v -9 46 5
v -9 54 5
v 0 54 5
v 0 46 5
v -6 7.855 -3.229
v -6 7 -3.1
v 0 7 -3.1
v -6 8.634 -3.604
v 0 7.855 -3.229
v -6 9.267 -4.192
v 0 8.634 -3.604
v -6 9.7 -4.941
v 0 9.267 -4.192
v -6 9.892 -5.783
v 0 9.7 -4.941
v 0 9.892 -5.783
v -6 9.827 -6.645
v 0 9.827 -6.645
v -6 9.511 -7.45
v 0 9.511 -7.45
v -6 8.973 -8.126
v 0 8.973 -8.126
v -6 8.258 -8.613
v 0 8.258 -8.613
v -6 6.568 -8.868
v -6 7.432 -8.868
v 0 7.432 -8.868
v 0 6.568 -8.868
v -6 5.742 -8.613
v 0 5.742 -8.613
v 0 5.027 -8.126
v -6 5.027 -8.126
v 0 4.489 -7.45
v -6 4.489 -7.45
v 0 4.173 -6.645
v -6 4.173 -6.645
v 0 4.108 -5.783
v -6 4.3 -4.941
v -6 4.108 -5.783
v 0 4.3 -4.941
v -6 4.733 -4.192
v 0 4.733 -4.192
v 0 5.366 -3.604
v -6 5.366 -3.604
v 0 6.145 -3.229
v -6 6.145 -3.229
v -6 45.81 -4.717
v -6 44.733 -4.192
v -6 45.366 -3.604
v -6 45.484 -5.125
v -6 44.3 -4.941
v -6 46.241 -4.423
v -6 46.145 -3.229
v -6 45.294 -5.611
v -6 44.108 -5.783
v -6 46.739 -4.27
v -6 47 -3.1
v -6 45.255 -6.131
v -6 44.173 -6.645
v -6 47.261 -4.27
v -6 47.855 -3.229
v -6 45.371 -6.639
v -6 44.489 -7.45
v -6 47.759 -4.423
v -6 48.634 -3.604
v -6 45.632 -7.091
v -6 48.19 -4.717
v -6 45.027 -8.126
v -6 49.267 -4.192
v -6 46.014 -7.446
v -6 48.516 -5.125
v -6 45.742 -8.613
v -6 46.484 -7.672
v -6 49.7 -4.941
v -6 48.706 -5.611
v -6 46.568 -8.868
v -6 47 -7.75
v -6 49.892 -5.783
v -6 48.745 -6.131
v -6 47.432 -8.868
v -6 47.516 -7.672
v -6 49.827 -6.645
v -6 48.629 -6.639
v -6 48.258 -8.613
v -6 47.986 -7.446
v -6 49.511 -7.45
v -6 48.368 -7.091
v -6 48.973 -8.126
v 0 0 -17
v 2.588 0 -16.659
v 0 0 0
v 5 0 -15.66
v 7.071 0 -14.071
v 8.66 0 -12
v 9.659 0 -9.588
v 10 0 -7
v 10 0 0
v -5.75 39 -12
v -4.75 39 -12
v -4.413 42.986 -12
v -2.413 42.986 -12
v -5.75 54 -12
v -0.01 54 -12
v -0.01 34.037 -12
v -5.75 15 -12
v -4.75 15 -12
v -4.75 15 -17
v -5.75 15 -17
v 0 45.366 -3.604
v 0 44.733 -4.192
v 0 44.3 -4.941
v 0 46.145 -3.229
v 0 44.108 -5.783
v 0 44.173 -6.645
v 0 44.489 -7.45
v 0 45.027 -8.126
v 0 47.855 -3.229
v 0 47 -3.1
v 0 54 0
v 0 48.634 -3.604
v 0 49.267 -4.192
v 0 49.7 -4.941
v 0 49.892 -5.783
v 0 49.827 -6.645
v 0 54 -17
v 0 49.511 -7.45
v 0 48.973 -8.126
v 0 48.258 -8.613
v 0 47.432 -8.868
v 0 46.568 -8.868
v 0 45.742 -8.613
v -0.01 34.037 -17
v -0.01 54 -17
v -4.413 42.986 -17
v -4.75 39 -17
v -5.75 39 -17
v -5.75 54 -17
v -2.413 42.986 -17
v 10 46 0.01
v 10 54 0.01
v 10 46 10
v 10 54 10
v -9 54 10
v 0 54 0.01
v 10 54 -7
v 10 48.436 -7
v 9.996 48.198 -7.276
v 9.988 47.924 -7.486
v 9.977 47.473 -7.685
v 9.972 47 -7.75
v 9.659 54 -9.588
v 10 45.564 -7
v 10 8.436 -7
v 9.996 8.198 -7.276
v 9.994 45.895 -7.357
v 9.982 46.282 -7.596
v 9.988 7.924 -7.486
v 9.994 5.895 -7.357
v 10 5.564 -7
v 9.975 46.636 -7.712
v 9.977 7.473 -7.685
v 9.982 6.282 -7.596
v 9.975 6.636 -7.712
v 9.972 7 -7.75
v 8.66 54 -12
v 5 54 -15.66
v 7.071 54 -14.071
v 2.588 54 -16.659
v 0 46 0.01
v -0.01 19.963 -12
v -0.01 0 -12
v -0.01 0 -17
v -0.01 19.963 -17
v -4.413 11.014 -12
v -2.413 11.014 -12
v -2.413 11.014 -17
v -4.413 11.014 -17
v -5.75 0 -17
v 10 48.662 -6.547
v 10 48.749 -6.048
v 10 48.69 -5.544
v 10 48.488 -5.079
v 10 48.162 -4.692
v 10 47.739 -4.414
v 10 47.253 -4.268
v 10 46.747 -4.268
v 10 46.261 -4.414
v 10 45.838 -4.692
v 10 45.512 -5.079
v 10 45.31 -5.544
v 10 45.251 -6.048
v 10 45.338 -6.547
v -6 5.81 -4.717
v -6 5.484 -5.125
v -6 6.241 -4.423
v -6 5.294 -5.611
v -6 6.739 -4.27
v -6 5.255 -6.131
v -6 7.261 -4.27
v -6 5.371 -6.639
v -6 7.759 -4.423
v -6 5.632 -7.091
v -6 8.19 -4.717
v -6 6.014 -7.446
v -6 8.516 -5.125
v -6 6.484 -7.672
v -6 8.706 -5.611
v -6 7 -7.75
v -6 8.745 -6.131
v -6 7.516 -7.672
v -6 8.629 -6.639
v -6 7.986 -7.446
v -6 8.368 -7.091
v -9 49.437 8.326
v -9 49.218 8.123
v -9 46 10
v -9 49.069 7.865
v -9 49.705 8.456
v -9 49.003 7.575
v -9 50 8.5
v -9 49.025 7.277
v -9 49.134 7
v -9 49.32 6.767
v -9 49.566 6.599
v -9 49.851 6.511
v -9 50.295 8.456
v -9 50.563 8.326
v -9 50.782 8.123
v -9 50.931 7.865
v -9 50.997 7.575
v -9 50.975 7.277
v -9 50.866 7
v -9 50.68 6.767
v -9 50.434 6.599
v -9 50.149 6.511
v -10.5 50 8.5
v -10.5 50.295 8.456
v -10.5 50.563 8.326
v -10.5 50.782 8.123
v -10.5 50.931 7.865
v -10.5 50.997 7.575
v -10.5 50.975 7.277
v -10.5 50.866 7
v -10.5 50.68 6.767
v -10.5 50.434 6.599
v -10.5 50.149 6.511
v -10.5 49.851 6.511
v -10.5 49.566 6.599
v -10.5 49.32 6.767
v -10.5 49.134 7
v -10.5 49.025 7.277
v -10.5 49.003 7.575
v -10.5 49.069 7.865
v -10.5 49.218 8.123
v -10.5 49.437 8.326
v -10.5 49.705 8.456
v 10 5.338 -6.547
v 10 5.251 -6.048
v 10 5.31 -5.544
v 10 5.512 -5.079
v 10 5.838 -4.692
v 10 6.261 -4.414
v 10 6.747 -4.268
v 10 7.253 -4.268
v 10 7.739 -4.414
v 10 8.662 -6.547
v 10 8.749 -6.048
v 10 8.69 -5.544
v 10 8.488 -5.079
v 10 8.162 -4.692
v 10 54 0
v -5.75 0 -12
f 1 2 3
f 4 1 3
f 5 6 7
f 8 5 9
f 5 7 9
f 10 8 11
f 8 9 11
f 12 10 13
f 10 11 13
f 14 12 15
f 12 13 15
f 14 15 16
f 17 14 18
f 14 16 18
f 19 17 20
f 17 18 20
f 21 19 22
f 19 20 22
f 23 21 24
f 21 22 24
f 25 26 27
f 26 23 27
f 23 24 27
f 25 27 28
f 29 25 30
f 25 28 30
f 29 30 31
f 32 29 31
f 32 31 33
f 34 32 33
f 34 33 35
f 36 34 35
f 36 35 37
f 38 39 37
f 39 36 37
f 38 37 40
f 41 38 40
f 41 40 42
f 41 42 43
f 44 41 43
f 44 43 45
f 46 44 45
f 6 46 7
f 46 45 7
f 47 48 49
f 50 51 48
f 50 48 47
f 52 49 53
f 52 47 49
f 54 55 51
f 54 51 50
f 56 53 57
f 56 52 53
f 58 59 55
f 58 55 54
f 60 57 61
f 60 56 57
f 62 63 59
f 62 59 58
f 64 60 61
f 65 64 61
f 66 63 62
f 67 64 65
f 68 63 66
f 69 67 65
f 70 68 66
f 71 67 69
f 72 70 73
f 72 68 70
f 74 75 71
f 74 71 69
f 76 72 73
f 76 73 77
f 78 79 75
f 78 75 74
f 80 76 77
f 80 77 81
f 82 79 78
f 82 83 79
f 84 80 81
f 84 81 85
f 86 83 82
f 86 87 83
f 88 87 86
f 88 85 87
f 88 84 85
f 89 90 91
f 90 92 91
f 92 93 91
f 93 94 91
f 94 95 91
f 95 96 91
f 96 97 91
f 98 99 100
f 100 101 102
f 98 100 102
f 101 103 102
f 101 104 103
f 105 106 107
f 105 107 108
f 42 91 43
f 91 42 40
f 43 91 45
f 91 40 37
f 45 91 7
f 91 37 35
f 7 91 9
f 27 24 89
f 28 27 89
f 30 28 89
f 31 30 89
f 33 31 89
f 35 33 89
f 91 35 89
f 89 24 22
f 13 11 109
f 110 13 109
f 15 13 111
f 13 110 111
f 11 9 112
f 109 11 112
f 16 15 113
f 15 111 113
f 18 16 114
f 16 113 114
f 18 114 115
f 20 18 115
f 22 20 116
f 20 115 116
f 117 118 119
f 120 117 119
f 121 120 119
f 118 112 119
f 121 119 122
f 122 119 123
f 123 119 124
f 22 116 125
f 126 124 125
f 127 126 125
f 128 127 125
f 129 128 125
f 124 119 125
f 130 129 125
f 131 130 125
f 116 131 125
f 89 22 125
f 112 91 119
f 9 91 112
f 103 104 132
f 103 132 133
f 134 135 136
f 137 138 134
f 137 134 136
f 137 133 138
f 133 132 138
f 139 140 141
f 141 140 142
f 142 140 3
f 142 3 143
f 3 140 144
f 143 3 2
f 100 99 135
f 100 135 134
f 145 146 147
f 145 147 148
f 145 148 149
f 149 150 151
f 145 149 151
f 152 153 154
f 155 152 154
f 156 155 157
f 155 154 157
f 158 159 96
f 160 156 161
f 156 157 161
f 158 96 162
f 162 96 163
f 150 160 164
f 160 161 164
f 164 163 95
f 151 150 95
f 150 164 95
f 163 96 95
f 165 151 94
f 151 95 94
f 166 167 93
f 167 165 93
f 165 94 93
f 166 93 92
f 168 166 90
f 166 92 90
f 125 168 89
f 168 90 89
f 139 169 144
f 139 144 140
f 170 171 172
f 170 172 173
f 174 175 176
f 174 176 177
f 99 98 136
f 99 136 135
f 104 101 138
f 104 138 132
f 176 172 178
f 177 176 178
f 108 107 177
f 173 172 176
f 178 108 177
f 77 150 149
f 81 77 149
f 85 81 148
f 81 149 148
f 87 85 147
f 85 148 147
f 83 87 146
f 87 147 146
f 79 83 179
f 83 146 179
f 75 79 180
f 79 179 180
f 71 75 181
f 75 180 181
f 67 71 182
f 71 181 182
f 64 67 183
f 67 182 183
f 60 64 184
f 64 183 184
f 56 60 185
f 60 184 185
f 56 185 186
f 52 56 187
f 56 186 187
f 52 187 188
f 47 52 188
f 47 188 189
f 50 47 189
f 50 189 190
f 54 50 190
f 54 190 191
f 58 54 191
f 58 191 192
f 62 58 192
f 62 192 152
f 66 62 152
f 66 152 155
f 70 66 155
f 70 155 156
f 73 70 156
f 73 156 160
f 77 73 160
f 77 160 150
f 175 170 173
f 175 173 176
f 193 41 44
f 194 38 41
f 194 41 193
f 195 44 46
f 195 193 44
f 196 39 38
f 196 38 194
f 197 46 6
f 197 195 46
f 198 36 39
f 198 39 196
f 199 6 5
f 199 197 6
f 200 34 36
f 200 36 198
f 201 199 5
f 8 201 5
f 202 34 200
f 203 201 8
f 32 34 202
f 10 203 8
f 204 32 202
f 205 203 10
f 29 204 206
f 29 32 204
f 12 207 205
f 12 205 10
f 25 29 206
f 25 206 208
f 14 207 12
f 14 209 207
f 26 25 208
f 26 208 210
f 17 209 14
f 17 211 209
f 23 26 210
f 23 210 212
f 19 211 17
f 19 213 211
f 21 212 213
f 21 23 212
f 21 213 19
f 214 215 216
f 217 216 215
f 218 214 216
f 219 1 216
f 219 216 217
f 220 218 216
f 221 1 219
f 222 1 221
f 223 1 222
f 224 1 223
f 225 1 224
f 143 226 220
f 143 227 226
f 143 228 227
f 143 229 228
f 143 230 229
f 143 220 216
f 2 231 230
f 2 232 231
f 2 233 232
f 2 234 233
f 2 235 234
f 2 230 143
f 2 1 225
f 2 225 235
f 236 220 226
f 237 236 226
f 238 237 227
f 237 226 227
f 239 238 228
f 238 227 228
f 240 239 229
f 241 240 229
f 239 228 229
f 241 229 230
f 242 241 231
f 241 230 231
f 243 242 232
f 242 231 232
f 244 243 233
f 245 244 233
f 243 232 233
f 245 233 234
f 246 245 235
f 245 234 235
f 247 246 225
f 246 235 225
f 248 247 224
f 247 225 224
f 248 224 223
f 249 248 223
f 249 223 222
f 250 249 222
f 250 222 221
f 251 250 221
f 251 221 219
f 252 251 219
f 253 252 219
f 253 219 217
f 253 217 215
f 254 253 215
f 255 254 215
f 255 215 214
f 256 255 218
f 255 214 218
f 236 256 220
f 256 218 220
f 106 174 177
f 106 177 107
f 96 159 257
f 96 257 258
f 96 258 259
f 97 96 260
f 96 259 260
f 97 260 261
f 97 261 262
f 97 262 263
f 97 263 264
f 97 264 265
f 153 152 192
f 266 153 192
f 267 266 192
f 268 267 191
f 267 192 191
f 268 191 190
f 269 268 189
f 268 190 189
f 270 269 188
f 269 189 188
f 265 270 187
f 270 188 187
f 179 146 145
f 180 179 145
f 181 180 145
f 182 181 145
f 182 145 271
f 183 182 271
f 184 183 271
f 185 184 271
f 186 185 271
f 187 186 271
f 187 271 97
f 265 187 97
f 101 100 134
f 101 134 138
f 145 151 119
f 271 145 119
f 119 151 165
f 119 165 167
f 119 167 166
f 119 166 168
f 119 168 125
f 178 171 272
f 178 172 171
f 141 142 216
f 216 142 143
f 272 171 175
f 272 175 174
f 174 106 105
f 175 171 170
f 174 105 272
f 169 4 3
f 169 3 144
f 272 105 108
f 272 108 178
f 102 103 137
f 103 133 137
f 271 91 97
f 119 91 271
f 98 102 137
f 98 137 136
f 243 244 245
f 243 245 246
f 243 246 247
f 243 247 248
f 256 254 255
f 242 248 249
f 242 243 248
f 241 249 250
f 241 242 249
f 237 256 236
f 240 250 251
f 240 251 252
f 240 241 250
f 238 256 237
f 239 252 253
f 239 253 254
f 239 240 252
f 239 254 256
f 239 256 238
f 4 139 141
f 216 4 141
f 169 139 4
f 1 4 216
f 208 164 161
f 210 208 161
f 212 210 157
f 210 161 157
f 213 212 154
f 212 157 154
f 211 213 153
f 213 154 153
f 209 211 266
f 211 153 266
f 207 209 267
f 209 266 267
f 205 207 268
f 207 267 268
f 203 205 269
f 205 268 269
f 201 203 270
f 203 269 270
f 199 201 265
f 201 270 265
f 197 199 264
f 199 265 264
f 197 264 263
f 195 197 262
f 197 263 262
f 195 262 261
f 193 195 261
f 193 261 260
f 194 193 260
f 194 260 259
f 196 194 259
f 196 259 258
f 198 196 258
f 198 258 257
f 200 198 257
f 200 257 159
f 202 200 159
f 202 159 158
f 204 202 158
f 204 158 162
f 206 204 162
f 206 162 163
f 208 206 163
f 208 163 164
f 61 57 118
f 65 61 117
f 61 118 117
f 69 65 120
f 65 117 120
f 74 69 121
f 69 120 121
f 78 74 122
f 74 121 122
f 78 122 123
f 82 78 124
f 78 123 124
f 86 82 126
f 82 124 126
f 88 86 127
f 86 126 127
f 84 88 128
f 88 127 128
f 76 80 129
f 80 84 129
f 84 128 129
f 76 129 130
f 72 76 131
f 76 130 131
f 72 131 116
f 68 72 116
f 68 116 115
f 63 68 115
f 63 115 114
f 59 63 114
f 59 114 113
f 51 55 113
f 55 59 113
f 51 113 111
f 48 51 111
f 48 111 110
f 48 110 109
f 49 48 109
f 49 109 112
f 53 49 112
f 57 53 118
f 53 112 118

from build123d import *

# Parameters (mm, degrees)
SKETCH1_W               = 12
SKETCH1_H               = 54
BOSS_EXTRUDE1_DEPTH     = 10
SKETCH2_R               = 2.9
BOSS_EXTRUDE2_DEPTH     = 18
SKETCH3_W               = 12
SKETCH3_H               = 54
BOSS_EXTRUDE3_DEPTH     = 10
SKETCH4_R               = 1.75
CUT_EXTRUDE1_DEPTH      = 50
SKETCH5_W               = 38
SKETCH5_H               = 54
BOSS_EXTRUDE4_DEPTH     = 5
FILLET1_R               = 10
SKETCH6_W               = 6
SKETCH6_H               = 54
CUT_EXTRUDE2_DEPTH      = 15
SKETCH7_W               = 0.01
SKETCH7_H               = 54
CUT_EXTRUDE3_DEPTH      = 12.5
BOSS_EXTRUDE5_DEPTH     = 8
SKETCH9_W               = 38
SKETCH9_H               = 0.01
CUT_EXTRUDE4_DEPTH      = 50
SKETCH10_W              = 11
SKETCH10_H              = 54
BOSS_EXTRUDE6_DEPTH     = 2.5
BOSS_EXTRUDE7_DEPTH     = 54
CUT_EXTRUDE5_DEPTH      = 10
CUT_EXTRUDE5_DEPTH_BACK = 5
CUT_EXTRUDE6_DEPTH      = 67.550732692
CUT_EXTRUDE6_DEPTH_BACK = 67.550732692
SKETCH15_W              = 34.984132004
SKETCH15_H              = 56.27391211
SKETCH16_R              = 1
BOSS_EXTRUDE8_DEPTH     = 1.5


with BuildPart() as part:
    # Sketch1 → Boss-Extrude1 (new body)
    with BuildSketch(Plane(origin=(0, 0, 0), x_dir=(0, 0, -1), z_dir=(1, 0, 0))):
        with Locations((6, 27)):
            Rectangle(SKETCH1_W, SKETCH1_H)
    extrude(amount=BOSS_EXTRUDE1_DEPTH)

    # Sketch2 → Boss-Extrude2 (add)
    with BuildSketch(Plane.ZY):
        with Locations((-6, 47)):
            Circle(SKETCH2_R)
        with Locations((-6, 7)):
            Circle(SKETCH2_R)
    extrude(amount=BOSS_EXTRUDE2_DEPTH)

    # Sketch3 → Boss-Extrude3 (add)
    with BuildSketch(Plane.ZY.offset(18)):
        with Locations((-6, 27)):
            Rectangle(SKETCH3_W, SKETCH3_H)
    extrude(amount=BOSS_EXTRUDE3_DEPTH)

    # Sketch4 → Cut-Extrude1 (cut)
    with BuildSketch(Plane(origin=(10, 0, 0), x_dir=(0, 0, -1), z_dir=(1, 0, 0))):
        with Locations((6, 47)):
            Circle(SKETCH4_R)
        with Locations((6, 7)):
            Circle(SKETCH4_R)
    extrude(amount=-CUT_EXTRUDE1_DEPTH, mode=Mode.SUBTRACT)

    # Sketch5 → Boss-Extrude4 (add)
    with BuildSketch(Plane(origin=(0, 0, -12), x_dir=(-1, 0, 0), z_dir=(0, 0, -1))):
        with Locations((9, 27)):
            Rectangle(SKETCH5_W, SKETCH5_H)
    extrude(amount=BOSS_EXTRUDE4_DEPTH)

    # Fillet1
    # the kernel refuses this fillet: 10 mm, written as the material it takes off along each edge
    with BuildSketch(Plane(origin=(10, -25, -17), x_dir=(-1, 0, 0), z_dir=(0, 1, 0))) as fillet1_piece_1:
        with BuildLine():
            CenterArc((FILLET1_R, FILLET1_R), FILLET1_R, 180, 90)
            Line((0, FILLET1_R), (0, 0))
            Line((0, 0), (FILLET1_R, 0))
        make_face()
    extrude(amount=104, mode=Mode.SUBTRACT)
    with BuildSketch(Plane(origin=(-28, 79, -17), x_dir=(0, 0, 1), z_dir=(0, -1, 0))) as fillet1_piece_2:
        with BuildLine():
            CenterArc((FILLET1_R, -FILLET1_R), FILLET1_R, 90, 90)
            Line((0, -FILLET1_R), (0, 0))
            Line((0, 0), (FILLET1_R, 0))
        make_face()
    extrude(amount=104, mode=Mode.SUBTRACT)

    # Sketch6 → Cut-Extrude2 (cut)
    with BuildSketch(Plane.XY.offset(-12)):
        with Locations((-9, 27)):
            Rectangle(SKETCH6_W, SKETCH6_H)
    extrude(amount=CUT_EXTRUDE2_DEPTH, mode=Mode.SUBTRACT)

    # Sketch7 → Cut-Extrude3 (cut)
    with BuildSketch(Plane.XY.offset(-12)):
        with Locations((-17.995, 27)):
            Rectangle(SKETCH7_W, SKETCH7_H)
        with Locations((-0.005, 27)):
            Rectangle(SKETCH7_W, SKETCH7_H)
    extrude(amount=-CUT_EXTRUDE3_DEPTH, mode=Mode.SUBTRACT)


with BuildPart() as cut_extrude3_piece_1:
    # of the separate pieces the step leaves, piece 1, a body of its own (cut_extrude3_pieces)
    add(part.part.solids().sort_by_distance((-18, 0, 0))[0])



with BuildPart() as cut_extrude3_piece_2:
    # of the separate pieces the step leaves, piece 2, a body of its own (cut_extrude3_pieces)
    add(part.part.solids().sort_by_distance((0, 0, -17))[0])


with BuildPart() as cut_extrude3_piece_3:
    # of the separate pieces the step leaves, piece 3, a body of its own (cut_extrude3_pieces)
    add(part.part.solids().sort_by_distance((-17.99, 0, -12))[0])



with BuildPart() as cut_extrude3_piece_1_1:
    add(cut_extrude3_piece_1.part)

    add(cut_extrude3_piece_2.part)  # Boss-Extrude5 merges Cut-Extrude3 piece 2
    # Sketch8 → Boss-Extrude5 (add)
    with BuildSketch(Plane(origin=(0, 54, 0), x_dir=(1, 0, 0), z_dir=(0, 1, 0))):
        Polygon((-18, 0), (-18, -5), (0, -5), (0, 0), (10, 0), (10, -10), (-28, -10), (-28, 0), align=None)
    extrude(amount=-BOSS_EXTRUDE5_DEPTH)

    # Sketch9 → Cut-Extrude4 (cut)
    with BuildSketch(Plane.XZ.offset(-46)):
        with Locations((-9, 0.005)):
            Rectangle(SKETCH9_W, SKETCH9_H)
    extrude(amount=-CUT_EXTRUDE4_DEPTH, mode=Mode.SUBTRACT)


with BuildPart() as cut_extrude4_piece_1:
    # of the separate pieces the step leaves, piece 1, a body of its own (cut_extrude4_pieces)
    add(cut_extrude3_piece_1_1.part.solids().sort_by_distance((0, 0, -17))[0])


with BuildPart() as cut_extrude4_piece_2:
    # of the separate pieces the step leaves, piece 2, a body of its own (cut_extrude4_pieces)
    add(cut_extrude3_piece_1_1.part.solids().sort_by_distance((-18, 0, 0))[0])


with BuildPart() as cut_extrude4_piece_3:
    # of the separate pieces the step leaves, piece 3, a body of its own (cut_extrude4_pieces)
    add(cut_extrude3_piece_1_1.part.solids().sort_by_distance((0, 54, 0.01))[0])


with BuildPart() as cut_extrude3_piece_3_1:
    add(cut_extrude3_piece_3.part)

    add(cut_extrude4_piece_2.part)  # Boss-Extrude6 merges Cut-Extrude4 piece 2
    # Sketch10 → Boss-Extrude6 (add)
    with BuildSketch(Plane(origin=(0, 0, -17), x_dir=(-1, 0, 0), z_dir=(0, 0, -1))):
        with Locations((12.5, 27)):
            Rectangle(SKETCH10_W, SKETCH10_H)
    extrude(amount=BOSS_EXTRUDE6_DEPTH)

    # Sketch11 → Boss-Extrude7 (add)
    with BuildSketch(Plane(origin=(0, 54, 0), x_dir=(1, 0, 0), z_dir=(0, 1, 0))):
        Polygon((-18, 18.25), (-19.25, 19.5), (-18, 19.5), align=None)
        Polygon((-7, 19.5), (-7, 18.25), (-5.75, 19.5), align=None)
    extrude(amount=-BOSS_EXTRUDE7_DEPTH)

    # Sketch13 → Cut-Extrude5 (cut, two sides: drawn at the far end of the back side and taken through both)
    with BuildSketch(Plane(origin=(0, 0, -17), x_dir=(-1, 0, 0), z_dir=(0, 0, -1)).offset(-CUT_EXTRUDE5_DEPTH_BACK)):
        Polygon((34.299684683, 54), (7, 54), (7, 0), (5.75, 0), (5.75, -4.476290179), (34.299684683, -4.476290179), align=None)
        Polygon((7, 54), (5.75, 54), (5.75, 39), (4.75, 39), (4.412537726, 42.985739481), (2.412537726, 42.985739481), (0.01, 34.037246006), (0.01, 19.962753994), (2.412537726, 11.014260519), (4.412537726, 11.014260519), (4.75, 15), (5.75, 15), (5.75, 0), (7, 0), align=None)
    extrude(amount=CUT_EXTRUDE5_DEPTH + CUT_EXTRUDE5_DEPTH_BACK, mode=Mode.SUBTRACT)


with BuildPart() as cut_extrude6_tool:
    # Sketch15 → Cut-Extrude6 (new, two sides: drawn at the far end of the back side and taken through both)
    with BuildSketch(Plane.XY.offset(10).offset(-CUT_EXTRUDE6_DEPTH_BACK)):
        with Locations((-26.492066002, 25.863043945)):
            Rectangle(SKETCH15_W, SKETCH15_H)
    extrude(amount=CUT_EXTRUDE6_DEPTH + CUT_EXTRUDE6_DEPTH_BACK)


with BuildPart() as cut_extrude3_piece_3_2:
    add(cut_extrude3_piece_3_1.part)

    # Cut-Extrude6: cut by cut_extrude6_tool
    add(cut_extrude6_tool.part, mode=Mode.SUBTRACT)


with BuildPart() as cut_extrude4_piece_3_1:
    add(cut_extrude4_piece_3.part)

    # Cut-Extrude6: cut by cut_extrude6_tool
    add(cut_extrude6_tool.part, mode=Mode.SUBTRACT)

    # Sketch16 → Boss-Extrude8 (add)
    with BuildSketch(Plane.ZY.offset(9)):
        with Locations((7.5, 50)):
            Circle(SKETCH16_R)
    extrude(amount=BOSS_EXTRUDE8_DEPTH)


solid = Compound([cut_extrude4_piece_1.part, cut_extrude3_piece_3_2.part, cut_extrude4_piece_3_1.part])
